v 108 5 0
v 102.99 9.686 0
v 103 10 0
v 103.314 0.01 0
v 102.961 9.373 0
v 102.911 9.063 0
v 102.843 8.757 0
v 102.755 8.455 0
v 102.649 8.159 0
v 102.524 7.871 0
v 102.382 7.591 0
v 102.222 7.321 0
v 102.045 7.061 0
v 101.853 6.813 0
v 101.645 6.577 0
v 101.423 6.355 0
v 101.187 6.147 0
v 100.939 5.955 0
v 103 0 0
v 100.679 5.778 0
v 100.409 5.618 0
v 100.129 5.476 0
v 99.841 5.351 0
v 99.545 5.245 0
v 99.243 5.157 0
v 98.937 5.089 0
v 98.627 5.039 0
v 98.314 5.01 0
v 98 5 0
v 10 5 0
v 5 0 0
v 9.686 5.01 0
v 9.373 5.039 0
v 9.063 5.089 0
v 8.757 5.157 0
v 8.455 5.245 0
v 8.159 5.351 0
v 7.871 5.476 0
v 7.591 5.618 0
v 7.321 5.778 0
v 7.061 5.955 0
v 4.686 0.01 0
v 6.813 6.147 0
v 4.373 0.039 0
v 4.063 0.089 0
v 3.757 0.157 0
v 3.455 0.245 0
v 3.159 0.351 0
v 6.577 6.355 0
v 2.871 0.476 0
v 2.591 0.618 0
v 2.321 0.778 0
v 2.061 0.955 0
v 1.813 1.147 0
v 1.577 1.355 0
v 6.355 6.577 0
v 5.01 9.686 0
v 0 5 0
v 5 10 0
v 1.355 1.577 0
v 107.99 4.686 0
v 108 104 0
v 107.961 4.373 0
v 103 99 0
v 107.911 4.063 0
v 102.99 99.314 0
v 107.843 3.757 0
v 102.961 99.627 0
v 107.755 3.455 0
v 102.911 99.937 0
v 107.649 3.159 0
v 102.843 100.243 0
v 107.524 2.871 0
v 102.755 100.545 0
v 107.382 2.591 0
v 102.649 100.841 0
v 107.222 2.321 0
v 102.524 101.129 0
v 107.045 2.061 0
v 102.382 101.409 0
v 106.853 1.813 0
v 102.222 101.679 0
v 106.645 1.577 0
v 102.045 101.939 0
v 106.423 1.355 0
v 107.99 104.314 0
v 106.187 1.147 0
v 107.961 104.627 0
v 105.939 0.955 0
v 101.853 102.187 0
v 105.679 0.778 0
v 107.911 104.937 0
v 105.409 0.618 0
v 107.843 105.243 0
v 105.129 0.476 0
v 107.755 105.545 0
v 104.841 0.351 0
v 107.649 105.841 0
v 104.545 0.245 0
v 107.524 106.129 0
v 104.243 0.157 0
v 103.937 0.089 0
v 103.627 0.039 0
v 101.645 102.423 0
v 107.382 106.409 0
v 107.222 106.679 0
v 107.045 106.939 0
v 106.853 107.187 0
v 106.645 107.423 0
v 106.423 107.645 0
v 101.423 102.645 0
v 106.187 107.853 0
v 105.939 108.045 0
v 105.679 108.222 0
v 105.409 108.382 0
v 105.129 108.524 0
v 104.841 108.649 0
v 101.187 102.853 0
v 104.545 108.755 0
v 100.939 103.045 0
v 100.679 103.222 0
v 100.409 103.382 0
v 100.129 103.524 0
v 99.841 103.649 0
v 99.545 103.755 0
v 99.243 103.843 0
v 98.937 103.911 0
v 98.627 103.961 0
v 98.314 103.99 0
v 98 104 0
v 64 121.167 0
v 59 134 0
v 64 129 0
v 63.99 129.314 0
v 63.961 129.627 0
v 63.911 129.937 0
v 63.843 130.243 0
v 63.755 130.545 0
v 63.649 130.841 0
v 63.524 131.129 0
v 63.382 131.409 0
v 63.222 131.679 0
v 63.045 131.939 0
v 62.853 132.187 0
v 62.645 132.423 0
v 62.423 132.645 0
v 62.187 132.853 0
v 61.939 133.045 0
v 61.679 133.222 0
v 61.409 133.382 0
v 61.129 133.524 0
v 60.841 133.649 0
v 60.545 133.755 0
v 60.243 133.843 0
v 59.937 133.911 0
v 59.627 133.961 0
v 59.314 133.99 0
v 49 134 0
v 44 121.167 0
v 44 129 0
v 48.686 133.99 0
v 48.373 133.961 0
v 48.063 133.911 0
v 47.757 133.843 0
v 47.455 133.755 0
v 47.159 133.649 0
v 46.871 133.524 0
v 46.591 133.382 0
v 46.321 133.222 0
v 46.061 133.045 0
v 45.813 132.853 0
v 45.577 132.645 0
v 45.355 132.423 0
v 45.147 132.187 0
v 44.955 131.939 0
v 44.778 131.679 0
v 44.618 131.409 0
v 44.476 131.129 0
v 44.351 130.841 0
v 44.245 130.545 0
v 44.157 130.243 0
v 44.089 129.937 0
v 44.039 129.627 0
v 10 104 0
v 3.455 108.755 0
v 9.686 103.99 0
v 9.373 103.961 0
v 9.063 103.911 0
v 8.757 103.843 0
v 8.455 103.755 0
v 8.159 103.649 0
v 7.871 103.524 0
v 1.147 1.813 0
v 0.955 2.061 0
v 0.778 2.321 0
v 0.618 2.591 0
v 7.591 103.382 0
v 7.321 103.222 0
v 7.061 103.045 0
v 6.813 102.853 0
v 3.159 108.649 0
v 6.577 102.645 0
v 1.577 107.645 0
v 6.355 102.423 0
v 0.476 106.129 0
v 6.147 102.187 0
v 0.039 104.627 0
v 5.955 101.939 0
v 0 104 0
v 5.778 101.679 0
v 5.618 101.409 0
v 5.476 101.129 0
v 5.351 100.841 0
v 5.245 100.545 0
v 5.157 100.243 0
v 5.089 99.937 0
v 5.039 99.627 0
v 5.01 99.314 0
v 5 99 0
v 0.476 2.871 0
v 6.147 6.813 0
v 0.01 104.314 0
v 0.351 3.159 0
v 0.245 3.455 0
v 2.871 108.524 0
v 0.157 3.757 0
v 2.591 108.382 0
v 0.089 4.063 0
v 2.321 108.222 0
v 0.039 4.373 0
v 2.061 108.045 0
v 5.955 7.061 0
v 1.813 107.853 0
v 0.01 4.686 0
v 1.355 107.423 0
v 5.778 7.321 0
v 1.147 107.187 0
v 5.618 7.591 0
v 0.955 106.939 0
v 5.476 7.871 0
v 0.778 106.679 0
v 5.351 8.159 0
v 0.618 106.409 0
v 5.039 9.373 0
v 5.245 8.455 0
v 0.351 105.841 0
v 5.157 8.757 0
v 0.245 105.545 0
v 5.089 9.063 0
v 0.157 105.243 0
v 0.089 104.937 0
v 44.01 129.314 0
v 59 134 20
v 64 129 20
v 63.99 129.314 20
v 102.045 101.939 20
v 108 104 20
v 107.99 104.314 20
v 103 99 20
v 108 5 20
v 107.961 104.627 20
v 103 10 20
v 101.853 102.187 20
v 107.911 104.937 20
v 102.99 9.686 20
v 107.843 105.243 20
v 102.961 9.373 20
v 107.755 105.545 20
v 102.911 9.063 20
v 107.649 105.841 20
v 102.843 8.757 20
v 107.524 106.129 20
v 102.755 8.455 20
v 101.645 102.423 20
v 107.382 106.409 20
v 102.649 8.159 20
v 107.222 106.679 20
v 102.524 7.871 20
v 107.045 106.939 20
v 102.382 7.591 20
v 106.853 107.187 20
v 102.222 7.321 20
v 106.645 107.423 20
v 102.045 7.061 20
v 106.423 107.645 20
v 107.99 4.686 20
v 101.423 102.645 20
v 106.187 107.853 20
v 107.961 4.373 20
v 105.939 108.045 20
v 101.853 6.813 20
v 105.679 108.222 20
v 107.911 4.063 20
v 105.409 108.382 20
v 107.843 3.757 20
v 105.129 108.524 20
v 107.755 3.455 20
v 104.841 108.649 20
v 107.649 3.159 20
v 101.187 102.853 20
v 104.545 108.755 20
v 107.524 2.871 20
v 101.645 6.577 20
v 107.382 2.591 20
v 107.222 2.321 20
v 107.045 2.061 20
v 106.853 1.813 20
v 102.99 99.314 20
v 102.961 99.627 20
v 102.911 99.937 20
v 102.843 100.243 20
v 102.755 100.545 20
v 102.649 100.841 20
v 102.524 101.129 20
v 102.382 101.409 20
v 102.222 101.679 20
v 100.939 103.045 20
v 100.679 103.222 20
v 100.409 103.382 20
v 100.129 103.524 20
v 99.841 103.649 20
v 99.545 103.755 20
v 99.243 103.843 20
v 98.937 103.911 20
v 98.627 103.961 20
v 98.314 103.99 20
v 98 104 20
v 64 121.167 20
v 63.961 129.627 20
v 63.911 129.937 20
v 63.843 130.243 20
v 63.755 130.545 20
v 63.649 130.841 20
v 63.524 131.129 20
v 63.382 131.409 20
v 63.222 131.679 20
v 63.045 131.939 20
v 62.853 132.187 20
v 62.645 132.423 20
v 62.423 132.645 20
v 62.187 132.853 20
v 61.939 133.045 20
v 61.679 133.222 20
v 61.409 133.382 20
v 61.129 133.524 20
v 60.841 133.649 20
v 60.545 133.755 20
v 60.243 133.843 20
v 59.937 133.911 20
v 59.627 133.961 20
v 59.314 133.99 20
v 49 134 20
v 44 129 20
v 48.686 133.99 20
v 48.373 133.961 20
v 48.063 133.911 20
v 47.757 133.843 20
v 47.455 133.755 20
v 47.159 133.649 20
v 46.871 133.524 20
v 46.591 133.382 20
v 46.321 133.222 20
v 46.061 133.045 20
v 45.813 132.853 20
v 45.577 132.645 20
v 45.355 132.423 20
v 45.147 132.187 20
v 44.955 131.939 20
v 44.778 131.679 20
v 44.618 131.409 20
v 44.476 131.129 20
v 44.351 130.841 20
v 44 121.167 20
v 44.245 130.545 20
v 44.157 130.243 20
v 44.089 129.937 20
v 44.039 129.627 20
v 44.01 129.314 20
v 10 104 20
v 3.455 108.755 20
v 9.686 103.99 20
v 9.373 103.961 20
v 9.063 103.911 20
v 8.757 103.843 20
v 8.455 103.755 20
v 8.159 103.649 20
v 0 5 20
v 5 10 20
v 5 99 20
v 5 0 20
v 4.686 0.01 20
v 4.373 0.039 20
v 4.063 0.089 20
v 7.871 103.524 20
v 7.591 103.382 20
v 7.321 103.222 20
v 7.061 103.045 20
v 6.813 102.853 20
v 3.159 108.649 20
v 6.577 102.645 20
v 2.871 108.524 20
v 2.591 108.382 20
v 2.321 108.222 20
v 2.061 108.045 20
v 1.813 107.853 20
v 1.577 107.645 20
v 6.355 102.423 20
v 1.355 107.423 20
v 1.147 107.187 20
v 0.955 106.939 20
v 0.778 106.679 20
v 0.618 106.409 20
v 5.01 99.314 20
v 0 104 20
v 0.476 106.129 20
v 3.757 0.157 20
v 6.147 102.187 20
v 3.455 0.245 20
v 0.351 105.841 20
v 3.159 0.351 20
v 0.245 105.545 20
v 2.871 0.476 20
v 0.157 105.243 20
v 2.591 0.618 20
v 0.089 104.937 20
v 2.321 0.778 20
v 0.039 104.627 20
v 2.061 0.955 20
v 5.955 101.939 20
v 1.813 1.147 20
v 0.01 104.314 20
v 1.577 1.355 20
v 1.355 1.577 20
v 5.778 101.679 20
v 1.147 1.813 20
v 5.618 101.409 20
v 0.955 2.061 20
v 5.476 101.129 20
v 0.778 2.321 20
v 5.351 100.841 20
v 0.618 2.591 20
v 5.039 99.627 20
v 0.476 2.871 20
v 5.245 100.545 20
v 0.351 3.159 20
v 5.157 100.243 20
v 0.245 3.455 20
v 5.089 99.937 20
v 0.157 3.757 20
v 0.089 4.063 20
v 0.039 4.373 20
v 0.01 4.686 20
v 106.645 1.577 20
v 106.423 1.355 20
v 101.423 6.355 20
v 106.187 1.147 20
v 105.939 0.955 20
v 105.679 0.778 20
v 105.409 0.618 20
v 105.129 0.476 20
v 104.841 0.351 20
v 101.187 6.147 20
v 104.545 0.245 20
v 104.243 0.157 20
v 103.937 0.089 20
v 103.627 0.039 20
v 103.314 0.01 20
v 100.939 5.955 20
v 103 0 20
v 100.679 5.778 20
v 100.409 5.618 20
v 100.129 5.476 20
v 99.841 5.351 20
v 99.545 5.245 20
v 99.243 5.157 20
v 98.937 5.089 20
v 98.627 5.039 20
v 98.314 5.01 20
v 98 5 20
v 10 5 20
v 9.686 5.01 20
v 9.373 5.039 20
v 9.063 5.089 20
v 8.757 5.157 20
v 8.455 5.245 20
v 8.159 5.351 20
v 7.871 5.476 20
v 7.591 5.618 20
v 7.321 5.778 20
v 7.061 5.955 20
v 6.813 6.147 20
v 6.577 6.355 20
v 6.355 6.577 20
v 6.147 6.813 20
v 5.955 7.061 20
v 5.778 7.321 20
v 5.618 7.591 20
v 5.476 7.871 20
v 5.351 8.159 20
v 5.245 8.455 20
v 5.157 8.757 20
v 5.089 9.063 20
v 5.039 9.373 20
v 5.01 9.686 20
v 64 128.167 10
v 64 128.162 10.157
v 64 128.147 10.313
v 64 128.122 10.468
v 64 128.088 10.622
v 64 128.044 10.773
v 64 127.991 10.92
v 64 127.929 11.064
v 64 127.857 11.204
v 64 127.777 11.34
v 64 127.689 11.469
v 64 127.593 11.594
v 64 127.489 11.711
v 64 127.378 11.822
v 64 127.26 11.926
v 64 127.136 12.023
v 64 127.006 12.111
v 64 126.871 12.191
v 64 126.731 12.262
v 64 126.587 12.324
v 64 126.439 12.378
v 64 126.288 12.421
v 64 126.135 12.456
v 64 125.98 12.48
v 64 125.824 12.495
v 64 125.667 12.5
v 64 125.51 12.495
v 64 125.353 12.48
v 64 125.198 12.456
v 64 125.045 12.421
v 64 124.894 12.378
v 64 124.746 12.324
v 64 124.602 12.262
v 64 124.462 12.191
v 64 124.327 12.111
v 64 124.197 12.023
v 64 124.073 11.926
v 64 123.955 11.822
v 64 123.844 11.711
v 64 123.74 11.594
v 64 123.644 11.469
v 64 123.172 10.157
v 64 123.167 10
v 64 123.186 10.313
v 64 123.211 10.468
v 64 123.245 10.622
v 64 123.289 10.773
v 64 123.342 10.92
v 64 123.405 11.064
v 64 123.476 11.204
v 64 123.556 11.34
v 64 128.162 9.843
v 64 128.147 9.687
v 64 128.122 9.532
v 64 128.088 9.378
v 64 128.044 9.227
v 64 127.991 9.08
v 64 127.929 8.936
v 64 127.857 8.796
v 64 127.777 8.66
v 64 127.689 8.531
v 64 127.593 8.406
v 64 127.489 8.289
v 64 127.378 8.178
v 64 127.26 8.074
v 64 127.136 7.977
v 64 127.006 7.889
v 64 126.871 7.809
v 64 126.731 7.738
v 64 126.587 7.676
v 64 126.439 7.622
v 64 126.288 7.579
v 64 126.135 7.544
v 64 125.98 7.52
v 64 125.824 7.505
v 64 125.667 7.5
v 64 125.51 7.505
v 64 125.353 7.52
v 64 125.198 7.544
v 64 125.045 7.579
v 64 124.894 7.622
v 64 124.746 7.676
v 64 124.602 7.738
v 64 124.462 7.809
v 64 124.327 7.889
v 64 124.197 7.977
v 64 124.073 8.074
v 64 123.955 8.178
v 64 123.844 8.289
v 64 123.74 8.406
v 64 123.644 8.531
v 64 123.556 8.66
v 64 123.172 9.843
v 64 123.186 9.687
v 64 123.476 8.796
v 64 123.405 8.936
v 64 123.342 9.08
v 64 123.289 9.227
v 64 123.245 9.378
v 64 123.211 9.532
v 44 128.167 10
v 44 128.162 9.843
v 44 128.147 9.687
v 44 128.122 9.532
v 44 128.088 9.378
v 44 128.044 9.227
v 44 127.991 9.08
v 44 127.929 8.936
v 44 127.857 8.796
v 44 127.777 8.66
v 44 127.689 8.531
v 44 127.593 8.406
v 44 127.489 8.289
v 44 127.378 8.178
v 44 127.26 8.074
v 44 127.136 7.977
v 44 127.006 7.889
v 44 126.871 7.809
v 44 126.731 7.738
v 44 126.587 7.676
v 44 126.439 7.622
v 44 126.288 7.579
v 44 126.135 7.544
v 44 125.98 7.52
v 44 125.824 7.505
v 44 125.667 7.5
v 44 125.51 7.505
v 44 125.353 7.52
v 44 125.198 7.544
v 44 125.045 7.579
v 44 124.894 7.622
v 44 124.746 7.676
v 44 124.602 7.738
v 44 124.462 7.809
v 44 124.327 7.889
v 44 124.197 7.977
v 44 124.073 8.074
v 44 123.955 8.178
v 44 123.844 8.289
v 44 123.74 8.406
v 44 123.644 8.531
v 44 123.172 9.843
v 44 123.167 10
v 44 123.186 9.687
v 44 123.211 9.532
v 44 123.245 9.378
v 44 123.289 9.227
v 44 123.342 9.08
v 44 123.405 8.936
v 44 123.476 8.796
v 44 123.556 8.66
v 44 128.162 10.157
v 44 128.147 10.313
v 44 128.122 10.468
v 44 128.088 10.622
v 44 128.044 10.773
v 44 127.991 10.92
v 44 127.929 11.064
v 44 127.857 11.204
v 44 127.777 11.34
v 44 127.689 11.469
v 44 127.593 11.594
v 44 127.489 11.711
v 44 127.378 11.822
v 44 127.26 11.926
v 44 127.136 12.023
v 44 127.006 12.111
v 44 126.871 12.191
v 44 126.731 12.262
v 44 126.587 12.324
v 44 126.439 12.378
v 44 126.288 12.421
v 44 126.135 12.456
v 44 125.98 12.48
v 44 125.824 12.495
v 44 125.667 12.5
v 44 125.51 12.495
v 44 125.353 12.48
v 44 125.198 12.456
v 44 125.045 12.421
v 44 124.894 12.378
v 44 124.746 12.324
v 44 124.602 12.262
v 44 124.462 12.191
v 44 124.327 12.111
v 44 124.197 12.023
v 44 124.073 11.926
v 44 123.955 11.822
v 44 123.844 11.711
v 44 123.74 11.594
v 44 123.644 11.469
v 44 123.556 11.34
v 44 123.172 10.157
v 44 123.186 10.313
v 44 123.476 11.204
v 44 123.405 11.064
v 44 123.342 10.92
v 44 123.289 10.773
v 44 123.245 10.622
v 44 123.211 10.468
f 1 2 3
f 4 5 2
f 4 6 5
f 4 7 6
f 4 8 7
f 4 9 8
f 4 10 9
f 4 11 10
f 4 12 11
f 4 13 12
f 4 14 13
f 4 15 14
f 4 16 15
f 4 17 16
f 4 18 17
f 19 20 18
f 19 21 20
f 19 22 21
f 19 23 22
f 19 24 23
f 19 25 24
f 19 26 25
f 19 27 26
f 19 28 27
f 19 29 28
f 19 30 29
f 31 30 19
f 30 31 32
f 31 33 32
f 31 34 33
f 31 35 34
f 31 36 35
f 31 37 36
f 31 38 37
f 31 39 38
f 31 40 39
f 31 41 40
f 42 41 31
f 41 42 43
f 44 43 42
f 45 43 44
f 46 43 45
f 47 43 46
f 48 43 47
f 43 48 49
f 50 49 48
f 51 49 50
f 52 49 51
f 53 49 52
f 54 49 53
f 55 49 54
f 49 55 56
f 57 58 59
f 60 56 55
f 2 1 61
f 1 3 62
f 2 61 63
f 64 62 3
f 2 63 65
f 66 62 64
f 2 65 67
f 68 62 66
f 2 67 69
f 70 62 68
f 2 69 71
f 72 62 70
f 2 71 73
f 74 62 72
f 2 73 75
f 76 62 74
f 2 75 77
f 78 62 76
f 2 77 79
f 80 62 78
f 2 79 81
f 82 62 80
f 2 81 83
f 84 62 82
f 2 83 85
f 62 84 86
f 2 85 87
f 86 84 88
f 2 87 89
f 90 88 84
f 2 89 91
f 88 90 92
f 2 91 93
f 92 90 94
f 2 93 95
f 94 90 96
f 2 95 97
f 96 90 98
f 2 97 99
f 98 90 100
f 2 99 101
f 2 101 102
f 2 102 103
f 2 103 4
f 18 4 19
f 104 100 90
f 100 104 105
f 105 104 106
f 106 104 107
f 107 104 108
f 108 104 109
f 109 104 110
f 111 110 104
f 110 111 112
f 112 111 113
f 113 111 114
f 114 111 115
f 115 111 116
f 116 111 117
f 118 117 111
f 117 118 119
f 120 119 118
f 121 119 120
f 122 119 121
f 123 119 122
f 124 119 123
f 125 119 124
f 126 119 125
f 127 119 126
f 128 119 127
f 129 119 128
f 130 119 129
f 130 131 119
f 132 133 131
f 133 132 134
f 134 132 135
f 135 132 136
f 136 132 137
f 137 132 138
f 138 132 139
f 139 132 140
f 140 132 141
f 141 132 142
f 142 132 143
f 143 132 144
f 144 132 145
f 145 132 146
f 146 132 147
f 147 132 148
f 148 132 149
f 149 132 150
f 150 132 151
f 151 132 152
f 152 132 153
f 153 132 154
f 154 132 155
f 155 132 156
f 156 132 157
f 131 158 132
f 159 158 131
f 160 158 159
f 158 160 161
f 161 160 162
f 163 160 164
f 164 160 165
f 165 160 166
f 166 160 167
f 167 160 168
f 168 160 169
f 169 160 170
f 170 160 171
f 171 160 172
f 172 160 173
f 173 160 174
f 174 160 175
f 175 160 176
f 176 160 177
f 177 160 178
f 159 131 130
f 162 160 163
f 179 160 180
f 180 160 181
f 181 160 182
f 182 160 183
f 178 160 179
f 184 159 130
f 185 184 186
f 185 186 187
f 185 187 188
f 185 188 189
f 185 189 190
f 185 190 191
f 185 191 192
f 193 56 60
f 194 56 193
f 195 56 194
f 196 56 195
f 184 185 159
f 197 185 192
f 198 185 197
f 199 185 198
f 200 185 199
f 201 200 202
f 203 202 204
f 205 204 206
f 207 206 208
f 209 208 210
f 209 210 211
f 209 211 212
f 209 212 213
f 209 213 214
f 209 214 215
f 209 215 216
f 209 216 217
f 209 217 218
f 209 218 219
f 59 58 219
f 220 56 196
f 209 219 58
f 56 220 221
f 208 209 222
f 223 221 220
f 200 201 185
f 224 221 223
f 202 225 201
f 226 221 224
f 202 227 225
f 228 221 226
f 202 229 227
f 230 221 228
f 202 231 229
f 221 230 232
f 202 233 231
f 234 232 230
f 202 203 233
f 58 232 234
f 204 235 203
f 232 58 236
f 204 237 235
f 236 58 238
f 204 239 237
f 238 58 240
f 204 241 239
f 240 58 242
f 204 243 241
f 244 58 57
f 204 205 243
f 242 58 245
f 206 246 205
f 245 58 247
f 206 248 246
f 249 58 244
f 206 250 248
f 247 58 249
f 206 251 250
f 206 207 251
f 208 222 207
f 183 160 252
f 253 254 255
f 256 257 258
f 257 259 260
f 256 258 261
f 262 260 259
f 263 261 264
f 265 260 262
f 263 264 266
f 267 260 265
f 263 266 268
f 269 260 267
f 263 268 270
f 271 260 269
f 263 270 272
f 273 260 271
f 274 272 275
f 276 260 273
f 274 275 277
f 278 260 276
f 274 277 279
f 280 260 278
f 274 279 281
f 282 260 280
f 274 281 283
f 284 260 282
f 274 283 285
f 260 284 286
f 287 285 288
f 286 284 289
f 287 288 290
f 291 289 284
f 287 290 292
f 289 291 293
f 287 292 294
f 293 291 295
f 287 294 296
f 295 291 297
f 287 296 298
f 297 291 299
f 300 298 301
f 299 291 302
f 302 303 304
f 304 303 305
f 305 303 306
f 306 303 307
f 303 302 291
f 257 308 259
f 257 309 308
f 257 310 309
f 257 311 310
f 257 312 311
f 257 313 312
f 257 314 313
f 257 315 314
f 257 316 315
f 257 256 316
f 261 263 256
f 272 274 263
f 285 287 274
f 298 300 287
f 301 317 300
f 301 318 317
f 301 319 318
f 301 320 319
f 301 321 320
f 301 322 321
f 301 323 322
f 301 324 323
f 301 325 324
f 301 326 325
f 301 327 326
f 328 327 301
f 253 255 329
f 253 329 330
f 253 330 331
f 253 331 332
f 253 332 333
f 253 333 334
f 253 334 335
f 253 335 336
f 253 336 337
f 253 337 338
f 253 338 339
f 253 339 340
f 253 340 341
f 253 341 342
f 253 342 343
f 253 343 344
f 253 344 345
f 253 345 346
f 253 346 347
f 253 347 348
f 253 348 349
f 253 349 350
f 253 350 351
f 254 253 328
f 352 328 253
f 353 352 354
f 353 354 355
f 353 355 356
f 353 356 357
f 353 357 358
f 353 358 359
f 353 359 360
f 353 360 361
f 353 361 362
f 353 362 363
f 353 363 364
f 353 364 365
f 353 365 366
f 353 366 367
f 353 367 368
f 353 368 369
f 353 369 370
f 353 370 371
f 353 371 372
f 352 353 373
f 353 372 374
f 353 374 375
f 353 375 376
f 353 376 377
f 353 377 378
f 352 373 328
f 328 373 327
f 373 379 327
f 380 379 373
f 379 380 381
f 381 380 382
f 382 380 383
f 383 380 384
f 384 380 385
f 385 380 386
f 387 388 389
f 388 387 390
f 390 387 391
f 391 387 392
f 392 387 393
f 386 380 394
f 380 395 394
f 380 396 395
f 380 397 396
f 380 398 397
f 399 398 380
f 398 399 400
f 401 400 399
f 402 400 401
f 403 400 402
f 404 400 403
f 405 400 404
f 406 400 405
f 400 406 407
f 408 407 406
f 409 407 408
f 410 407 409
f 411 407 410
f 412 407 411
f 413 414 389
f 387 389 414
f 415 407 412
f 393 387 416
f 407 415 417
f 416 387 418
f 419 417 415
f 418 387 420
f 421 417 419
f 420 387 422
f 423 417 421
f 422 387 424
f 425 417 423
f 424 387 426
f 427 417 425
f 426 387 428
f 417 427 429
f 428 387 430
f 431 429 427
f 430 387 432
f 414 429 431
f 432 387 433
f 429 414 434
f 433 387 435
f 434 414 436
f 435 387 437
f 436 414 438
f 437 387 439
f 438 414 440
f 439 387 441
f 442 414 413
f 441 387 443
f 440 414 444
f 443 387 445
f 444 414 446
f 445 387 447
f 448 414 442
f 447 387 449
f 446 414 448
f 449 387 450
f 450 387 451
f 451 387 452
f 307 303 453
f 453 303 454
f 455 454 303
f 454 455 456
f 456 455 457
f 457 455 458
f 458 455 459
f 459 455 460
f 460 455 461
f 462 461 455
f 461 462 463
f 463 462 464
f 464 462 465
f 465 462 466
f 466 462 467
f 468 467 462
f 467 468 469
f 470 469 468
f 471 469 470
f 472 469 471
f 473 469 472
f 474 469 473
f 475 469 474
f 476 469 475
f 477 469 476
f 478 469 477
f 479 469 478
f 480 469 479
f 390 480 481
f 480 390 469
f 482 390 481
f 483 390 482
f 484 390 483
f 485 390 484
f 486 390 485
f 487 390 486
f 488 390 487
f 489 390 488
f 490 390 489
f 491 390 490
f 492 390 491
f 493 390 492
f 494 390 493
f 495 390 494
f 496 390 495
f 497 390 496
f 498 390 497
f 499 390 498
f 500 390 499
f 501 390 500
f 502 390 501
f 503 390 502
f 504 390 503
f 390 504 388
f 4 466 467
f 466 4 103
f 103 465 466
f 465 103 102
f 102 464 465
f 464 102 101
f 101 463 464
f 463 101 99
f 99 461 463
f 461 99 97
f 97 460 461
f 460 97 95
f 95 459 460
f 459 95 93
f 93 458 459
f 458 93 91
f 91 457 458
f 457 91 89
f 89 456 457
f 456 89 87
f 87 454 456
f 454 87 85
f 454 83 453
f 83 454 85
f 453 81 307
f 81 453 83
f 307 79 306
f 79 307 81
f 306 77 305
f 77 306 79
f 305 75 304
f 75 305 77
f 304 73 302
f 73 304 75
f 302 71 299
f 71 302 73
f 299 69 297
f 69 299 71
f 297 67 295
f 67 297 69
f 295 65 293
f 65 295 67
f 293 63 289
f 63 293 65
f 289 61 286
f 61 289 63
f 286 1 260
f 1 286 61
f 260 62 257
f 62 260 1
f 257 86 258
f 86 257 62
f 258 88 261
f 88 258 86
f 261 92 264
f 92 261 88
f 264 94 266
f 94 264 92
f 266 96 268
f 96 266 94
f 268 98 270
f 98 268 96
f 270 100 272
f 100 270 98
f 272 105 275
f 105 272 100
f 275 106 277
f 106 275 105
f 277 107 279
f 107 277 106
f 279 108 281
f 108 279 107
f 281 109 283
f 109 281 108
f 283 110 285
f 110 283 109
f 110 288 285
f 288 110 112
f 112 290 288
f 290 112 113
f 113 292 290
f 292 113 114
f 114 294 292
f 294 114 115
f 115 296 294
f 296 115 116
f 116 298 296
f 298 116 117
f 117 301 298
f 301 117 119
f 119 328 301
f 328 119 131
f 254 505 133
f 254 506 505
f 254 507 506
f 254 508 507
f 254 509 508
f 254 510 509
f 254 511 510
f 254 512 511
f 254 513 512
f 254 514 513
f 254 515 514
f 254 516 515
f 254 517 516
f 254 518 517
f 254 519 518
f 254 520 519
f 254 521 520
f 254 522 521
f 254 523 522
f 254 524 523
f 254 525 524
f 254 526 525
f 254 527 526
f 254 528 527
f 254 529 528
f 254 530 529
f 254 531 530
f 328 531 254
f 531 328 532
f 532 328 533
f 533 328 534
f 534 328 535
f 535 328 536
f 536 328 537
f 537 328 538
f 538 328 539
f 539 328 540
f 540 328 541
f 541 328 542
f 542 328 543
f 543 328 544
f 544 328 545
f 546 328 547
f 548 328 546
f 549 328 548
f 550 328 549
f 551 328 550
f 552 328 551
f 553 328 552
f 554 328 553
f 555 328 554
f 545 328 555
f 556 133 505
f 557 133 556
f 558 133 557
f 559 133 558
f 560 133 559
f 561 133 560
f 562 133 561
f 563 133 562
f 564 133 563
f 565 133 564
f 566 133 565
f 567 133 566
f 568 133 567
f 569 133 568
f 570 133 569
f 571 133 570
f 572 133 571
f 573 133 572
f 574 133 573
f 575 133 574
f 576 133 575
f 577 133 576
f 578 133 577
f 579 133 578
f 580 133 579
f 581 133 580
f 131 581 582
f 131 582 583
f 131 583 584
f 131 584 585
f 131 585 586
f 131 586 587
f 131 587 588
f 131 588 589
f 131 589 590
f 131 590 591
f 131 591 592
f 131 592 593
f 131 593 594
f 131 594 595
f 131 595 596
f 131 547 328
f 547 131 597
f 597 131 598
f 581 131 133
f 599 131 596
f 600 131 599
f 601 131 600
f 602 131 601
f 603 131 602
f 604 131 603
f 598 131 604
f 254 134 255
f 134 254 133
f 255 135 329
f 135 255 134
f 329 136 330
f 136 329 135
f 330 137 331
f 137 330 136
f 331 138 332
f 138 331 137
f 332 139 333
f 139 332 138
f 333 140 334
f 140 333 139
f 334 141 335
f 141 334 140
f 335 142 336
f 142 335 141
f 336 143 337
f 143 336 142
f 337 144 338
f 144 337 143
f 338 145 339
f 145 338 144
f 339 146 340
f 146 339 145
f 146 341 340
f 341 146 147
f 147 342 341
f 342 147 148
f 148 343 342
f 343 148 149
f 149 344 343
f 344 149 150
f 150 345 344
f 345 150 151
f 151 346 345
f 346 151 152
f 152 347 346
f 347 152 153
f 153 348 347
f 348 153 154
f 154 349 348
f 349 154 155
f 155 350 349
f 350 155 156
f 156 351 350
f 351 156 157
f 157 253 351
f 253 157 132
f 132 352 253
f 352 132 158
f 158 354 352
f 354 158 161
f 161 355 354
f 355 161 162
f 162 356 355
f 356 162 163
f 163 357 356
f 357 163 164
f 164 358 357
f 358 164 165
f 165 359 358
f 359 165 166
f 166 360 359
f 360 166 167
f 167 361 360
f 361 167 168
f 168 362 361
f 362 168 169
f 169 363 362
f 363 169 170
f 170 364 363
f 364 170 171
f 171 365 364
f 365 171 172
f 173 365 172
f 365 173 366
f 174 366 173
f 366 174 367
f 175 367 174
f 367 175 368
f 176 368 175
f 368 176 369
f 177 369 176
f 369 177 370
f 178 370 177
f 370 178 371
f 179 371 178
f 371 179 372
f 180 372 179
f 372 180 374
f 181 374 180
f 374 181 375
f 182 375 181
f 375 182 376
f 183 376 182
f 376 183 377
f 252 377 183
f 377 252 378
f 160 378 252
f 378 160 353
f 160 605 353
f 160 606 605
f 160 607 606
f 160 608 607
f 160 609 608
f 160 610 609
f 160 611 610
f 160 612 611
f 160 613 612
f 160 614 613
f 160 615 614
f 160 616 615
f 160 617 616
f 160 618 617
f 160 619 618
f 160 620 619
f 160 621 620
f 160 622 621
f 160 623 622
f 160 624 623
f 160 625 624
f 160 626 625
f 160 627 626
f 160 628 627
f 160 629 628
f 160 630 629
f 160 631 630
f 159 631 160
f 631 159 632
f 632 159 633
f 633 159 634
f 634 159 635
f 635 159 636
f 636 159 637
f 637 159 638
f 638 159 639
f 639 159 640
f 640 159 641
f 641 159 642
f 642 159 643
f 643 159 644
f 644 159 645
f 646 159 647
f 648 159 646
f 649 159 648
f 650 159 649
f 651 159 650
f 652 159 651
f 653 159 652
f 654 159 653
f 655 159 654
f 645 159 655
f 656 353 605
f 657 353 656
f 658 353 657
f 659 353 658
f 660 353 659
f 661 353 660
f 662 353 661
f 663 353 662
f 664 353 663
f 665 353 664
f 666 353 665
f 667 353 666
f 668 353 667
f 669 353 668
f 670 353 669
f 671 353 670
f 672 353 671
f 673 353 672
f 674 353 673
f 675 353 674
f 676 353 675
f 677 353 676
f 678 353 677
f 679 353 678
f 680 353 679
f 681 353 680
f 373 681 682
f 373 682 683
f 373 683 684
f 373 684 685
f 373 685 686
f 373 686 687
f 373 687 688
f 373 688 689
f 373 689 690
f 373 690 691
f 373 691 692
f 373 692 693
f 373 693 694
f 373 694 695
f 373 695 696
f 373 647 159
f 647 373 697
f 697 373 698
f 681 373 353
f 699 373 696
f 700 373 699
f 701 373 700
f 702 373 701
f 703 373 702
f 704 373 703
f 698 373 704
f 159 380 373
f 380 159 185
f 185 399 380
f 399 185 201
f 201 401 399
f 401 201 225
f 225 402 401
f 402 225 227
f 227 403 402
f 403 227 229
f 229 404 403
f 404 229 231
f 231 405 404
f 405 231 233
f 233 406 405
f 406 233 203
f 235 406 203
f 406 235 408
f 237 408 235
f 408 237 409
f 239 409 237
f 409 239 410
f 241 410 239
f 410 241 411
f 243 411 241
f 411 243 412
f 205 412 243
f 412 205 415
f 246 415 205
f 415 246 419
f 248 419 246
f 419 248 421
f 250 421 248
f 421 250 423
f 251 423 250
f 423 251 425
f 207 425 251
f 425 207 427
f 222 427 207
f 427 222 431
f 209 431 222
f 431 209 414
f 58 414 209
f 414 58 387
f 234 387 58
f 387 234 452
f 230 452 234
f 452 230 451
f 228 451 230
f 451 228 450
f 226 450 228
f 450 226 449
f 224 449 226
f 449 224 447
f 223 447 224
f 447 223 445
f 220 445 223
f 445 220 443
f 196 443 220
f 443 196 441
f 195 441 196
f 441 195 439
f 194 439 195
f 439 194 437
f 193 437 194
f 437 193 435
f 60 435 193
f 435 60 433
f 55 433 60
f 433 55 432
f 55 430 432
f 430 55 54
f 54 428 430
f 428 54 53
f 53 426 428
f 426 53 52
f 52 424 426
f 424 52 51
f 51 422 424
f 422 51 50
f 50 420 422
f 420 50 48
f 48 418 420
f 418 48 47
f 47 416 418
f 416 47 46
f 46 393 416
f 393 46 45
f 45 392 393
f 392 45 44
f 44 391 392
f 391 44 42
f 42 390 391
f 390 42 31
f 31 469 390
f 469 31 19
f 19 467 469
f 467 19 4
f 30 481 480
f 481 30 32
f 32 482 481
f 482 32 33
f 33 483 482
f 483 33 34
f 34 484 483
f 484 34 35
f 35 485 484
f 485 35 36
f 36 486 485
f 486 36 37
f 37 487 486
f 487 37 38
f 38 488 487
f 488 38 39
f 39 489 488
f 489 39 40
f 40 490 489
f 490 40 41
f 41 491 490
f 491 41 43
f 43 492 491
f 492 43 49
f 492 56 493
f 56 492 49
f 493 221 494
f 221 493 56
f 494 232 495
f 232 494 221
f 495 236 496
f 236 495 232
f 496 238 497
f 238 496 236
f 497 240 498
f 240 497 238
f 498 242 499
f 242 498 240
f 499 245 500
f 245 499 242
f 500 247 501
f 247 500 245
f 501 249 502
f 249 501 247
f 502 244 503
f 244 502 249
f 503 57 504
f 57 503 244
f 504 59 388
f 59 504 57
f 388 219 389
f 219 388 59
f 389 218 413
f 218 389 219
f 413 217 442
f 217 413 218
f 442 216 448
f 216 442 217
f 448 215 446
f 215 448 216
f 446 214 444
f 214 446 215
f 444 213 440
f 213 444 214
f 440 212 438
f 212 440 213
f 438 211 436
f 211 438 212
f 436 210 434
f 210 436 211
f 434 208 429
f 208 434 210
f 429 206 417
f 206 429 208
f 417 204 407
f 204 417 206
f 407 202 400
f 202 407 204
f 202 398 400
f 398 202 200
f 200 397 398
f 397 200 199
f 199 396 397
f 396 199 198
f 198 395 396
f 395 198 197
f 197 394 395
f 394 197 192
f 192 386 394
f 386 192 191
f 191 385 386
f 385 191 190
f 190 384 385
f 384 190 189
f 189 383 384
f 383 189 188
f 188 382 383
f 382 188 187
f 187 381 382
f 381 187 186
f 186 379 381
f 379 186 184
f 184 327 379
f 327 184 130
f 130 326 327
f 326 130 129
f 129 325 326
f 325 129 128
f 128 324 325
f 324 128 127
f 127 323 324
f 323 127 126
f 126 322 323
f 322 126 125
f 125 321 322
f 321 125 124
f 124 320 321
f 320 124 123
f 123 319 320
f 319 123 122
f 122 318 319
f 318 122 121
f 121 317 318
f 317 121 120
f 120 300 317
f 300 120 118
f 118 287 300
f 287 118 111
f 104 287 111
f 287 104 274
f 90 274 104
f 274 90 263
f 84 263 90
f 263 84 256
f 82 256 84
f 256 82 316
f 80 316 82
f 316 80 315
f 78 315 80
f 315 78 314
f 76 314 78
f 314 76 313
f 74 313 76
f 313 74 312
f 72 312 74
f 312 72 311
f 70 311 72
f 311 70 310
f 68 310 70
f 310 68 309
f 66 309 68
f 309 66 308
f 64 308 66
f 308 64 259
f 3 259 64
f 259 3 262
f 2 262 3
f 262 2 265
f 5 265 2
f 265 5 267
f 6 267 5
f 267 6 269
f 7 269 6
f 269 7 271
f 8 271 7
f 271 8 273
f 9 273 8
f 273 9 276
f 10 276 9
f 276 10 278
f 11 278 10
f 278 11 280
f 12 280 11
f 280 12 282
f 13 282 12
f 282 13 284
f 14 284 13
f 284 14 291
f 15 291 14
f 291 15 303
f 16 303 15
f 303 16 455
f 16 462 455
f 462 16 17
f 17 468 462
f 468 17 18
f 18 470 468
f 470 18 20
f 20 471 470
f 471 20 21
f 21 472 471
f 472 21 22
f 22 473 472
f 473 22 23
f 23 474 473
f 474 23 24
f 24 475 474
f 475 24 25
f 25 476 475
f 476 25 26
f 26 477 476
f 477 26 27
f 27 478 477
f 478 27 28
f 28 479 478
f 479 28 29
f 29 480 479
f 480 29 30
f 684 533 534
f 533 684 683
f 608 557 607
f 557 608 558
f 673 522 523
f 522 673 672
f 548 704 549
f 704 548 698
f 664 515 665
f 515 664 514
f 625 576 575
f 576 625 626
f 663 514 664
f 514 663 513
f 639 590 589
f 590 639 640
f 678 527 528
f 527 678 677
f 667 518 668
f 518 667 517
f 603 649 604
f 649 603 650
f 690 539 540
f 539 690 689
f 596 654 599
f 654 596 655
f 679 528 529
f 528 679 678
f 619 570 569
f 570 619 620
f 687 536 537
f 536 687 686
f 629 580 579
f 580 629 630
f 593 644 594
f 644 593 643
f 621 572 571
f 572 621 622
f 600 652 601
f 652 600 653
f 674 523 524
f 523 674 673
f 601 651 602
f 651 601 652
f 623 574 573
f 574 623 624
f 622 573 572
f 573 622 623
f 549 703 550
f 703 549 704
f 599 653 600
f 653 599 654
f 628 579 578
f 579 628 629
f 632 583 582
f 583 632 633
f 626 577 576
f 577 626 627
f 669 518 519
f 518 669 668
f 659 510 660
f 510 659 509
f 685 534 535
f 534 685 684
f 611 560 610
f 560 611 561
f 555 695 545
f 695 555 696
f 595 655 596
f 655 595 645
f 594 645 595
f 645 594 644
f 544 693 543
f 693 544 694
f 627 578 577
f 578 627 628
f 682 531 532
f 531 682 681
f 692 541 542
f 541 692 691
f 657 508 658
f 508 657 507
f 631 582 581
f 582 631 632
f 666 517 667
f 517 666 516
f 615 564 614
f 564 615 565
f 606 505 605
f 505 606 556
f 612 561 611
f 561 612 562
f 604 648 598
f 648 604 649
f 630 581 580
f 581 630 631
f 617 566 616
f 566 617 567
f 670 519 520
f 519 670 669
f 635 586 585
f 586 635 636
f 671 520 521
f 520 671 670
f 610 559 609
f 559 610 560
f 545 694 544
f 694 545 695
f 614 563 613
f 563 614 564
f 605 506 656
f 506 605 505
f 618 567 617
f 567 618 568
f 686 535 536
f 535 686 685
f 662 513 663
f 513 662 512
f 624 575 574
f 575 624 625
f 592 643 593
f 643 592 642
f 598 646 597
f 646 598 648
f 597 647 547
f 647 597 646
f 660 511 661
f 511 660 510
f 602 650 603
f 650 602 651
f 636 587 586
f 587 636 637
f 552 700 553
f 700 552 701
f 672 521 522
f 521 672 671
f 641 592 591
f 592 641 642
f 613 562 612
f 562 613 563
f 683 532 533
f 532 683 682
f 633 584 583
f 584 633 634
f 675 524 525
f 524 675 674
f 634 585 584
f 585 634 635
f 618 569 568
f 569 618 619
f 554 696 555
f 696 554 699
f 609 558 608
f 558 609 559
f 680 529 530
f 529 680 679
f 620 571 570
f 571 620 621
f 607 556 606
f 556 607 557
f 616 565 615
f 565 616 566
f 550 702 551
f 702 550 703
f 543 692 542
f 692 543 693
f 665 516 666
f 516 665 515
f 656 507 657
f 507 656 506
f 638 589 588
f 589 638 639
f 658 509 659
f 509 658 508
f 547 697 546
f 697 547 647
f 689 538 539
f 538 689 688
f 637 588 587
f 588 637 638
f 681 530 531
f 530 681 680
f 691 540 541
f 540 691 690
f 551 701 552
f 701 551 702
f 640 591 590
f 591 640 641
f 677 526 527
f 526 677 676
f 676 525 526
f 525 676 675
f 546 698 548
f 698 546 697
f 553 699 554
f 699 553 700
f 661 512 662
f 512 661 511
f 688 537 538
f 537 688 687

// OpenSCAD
$fn = 100;

// 10 cm (H): 60.5 cm (W): 11 cm (D)

DEPTH = 20;
INNER_WIDTH = 98;
INNER_HEIGHT = 99;
WALL_WIDTH = 5;
CORNER_RADIUS = 5;
HANGER_HEIGHT = 10;
HANGER_TOP_HEIGHT = 20;
HANGER_WIDTH = 20;
HANGER_RADIUS = 2;
HOLE_RADIUS = 2.5;

// Calculated
OUTER_WIDTH = INNER_WIDTH + 2*WALL_WIDTH;
OUTER_HEIGHT = INNER_HEIGHT + 2*WALL_WIDTH;
HANGER_RADIUS = HANGER_WIDTH / 4;
TOP_HEIGHT = OUTER_HEIGHT + HANGER_HEIGHT;

module rounded_rect(w, h, r) {
  hull() {
    translate([r, r]) {
      circle(r);
    }
    translate([w-r, r]) {
      circle(r);
    }
    translate([r, h-r]) {
      circle(r);
    }
    translate([w-r, h-r]) {
      circle(r);
    }
  }
}

difference() {
  linear_extrude(DEPTH) {
    difference() {
      // Solid
      union() {
        hull() {
          // Outside
          rounded_rect(OUTER_WIDTH, OUTER_HEIGHT, CORNER_RADIUS);
          // Top point
          translate([OUTER_WIDTH/2, TOP_HEIGHT]) {
            circle(HANGER_RADIUS);
          }
        }
        // Top hanger
        translate([(OUTER_WIDTH - HANGER_WIDTH)/2, TOP_HEIGHT-HANGER_RADIUS]) {
          rounded_rect(HANGER_WIDTH, HANGER_TOP_HEIGHT, HANGER_RADIUS);
        }
      }
      // Centre
      translate([WALL_WIDTH, WALL_WIDTH]) {
        rounded_rect(INNER_WIDTH, INNER_HEIGHT, CORNER_RADIUS);
      }
    }
  }
  // Hanger hole
  translate([0, TOP_HEIGHT + HANGER_TOP_HEIGHT / 3, DEPTH/2]) {
    rotate([0, 90, 0]) {
      cylinder(h=OUTER_WIDTH, r=HOLE_RADIUS);
    }
  }
}
